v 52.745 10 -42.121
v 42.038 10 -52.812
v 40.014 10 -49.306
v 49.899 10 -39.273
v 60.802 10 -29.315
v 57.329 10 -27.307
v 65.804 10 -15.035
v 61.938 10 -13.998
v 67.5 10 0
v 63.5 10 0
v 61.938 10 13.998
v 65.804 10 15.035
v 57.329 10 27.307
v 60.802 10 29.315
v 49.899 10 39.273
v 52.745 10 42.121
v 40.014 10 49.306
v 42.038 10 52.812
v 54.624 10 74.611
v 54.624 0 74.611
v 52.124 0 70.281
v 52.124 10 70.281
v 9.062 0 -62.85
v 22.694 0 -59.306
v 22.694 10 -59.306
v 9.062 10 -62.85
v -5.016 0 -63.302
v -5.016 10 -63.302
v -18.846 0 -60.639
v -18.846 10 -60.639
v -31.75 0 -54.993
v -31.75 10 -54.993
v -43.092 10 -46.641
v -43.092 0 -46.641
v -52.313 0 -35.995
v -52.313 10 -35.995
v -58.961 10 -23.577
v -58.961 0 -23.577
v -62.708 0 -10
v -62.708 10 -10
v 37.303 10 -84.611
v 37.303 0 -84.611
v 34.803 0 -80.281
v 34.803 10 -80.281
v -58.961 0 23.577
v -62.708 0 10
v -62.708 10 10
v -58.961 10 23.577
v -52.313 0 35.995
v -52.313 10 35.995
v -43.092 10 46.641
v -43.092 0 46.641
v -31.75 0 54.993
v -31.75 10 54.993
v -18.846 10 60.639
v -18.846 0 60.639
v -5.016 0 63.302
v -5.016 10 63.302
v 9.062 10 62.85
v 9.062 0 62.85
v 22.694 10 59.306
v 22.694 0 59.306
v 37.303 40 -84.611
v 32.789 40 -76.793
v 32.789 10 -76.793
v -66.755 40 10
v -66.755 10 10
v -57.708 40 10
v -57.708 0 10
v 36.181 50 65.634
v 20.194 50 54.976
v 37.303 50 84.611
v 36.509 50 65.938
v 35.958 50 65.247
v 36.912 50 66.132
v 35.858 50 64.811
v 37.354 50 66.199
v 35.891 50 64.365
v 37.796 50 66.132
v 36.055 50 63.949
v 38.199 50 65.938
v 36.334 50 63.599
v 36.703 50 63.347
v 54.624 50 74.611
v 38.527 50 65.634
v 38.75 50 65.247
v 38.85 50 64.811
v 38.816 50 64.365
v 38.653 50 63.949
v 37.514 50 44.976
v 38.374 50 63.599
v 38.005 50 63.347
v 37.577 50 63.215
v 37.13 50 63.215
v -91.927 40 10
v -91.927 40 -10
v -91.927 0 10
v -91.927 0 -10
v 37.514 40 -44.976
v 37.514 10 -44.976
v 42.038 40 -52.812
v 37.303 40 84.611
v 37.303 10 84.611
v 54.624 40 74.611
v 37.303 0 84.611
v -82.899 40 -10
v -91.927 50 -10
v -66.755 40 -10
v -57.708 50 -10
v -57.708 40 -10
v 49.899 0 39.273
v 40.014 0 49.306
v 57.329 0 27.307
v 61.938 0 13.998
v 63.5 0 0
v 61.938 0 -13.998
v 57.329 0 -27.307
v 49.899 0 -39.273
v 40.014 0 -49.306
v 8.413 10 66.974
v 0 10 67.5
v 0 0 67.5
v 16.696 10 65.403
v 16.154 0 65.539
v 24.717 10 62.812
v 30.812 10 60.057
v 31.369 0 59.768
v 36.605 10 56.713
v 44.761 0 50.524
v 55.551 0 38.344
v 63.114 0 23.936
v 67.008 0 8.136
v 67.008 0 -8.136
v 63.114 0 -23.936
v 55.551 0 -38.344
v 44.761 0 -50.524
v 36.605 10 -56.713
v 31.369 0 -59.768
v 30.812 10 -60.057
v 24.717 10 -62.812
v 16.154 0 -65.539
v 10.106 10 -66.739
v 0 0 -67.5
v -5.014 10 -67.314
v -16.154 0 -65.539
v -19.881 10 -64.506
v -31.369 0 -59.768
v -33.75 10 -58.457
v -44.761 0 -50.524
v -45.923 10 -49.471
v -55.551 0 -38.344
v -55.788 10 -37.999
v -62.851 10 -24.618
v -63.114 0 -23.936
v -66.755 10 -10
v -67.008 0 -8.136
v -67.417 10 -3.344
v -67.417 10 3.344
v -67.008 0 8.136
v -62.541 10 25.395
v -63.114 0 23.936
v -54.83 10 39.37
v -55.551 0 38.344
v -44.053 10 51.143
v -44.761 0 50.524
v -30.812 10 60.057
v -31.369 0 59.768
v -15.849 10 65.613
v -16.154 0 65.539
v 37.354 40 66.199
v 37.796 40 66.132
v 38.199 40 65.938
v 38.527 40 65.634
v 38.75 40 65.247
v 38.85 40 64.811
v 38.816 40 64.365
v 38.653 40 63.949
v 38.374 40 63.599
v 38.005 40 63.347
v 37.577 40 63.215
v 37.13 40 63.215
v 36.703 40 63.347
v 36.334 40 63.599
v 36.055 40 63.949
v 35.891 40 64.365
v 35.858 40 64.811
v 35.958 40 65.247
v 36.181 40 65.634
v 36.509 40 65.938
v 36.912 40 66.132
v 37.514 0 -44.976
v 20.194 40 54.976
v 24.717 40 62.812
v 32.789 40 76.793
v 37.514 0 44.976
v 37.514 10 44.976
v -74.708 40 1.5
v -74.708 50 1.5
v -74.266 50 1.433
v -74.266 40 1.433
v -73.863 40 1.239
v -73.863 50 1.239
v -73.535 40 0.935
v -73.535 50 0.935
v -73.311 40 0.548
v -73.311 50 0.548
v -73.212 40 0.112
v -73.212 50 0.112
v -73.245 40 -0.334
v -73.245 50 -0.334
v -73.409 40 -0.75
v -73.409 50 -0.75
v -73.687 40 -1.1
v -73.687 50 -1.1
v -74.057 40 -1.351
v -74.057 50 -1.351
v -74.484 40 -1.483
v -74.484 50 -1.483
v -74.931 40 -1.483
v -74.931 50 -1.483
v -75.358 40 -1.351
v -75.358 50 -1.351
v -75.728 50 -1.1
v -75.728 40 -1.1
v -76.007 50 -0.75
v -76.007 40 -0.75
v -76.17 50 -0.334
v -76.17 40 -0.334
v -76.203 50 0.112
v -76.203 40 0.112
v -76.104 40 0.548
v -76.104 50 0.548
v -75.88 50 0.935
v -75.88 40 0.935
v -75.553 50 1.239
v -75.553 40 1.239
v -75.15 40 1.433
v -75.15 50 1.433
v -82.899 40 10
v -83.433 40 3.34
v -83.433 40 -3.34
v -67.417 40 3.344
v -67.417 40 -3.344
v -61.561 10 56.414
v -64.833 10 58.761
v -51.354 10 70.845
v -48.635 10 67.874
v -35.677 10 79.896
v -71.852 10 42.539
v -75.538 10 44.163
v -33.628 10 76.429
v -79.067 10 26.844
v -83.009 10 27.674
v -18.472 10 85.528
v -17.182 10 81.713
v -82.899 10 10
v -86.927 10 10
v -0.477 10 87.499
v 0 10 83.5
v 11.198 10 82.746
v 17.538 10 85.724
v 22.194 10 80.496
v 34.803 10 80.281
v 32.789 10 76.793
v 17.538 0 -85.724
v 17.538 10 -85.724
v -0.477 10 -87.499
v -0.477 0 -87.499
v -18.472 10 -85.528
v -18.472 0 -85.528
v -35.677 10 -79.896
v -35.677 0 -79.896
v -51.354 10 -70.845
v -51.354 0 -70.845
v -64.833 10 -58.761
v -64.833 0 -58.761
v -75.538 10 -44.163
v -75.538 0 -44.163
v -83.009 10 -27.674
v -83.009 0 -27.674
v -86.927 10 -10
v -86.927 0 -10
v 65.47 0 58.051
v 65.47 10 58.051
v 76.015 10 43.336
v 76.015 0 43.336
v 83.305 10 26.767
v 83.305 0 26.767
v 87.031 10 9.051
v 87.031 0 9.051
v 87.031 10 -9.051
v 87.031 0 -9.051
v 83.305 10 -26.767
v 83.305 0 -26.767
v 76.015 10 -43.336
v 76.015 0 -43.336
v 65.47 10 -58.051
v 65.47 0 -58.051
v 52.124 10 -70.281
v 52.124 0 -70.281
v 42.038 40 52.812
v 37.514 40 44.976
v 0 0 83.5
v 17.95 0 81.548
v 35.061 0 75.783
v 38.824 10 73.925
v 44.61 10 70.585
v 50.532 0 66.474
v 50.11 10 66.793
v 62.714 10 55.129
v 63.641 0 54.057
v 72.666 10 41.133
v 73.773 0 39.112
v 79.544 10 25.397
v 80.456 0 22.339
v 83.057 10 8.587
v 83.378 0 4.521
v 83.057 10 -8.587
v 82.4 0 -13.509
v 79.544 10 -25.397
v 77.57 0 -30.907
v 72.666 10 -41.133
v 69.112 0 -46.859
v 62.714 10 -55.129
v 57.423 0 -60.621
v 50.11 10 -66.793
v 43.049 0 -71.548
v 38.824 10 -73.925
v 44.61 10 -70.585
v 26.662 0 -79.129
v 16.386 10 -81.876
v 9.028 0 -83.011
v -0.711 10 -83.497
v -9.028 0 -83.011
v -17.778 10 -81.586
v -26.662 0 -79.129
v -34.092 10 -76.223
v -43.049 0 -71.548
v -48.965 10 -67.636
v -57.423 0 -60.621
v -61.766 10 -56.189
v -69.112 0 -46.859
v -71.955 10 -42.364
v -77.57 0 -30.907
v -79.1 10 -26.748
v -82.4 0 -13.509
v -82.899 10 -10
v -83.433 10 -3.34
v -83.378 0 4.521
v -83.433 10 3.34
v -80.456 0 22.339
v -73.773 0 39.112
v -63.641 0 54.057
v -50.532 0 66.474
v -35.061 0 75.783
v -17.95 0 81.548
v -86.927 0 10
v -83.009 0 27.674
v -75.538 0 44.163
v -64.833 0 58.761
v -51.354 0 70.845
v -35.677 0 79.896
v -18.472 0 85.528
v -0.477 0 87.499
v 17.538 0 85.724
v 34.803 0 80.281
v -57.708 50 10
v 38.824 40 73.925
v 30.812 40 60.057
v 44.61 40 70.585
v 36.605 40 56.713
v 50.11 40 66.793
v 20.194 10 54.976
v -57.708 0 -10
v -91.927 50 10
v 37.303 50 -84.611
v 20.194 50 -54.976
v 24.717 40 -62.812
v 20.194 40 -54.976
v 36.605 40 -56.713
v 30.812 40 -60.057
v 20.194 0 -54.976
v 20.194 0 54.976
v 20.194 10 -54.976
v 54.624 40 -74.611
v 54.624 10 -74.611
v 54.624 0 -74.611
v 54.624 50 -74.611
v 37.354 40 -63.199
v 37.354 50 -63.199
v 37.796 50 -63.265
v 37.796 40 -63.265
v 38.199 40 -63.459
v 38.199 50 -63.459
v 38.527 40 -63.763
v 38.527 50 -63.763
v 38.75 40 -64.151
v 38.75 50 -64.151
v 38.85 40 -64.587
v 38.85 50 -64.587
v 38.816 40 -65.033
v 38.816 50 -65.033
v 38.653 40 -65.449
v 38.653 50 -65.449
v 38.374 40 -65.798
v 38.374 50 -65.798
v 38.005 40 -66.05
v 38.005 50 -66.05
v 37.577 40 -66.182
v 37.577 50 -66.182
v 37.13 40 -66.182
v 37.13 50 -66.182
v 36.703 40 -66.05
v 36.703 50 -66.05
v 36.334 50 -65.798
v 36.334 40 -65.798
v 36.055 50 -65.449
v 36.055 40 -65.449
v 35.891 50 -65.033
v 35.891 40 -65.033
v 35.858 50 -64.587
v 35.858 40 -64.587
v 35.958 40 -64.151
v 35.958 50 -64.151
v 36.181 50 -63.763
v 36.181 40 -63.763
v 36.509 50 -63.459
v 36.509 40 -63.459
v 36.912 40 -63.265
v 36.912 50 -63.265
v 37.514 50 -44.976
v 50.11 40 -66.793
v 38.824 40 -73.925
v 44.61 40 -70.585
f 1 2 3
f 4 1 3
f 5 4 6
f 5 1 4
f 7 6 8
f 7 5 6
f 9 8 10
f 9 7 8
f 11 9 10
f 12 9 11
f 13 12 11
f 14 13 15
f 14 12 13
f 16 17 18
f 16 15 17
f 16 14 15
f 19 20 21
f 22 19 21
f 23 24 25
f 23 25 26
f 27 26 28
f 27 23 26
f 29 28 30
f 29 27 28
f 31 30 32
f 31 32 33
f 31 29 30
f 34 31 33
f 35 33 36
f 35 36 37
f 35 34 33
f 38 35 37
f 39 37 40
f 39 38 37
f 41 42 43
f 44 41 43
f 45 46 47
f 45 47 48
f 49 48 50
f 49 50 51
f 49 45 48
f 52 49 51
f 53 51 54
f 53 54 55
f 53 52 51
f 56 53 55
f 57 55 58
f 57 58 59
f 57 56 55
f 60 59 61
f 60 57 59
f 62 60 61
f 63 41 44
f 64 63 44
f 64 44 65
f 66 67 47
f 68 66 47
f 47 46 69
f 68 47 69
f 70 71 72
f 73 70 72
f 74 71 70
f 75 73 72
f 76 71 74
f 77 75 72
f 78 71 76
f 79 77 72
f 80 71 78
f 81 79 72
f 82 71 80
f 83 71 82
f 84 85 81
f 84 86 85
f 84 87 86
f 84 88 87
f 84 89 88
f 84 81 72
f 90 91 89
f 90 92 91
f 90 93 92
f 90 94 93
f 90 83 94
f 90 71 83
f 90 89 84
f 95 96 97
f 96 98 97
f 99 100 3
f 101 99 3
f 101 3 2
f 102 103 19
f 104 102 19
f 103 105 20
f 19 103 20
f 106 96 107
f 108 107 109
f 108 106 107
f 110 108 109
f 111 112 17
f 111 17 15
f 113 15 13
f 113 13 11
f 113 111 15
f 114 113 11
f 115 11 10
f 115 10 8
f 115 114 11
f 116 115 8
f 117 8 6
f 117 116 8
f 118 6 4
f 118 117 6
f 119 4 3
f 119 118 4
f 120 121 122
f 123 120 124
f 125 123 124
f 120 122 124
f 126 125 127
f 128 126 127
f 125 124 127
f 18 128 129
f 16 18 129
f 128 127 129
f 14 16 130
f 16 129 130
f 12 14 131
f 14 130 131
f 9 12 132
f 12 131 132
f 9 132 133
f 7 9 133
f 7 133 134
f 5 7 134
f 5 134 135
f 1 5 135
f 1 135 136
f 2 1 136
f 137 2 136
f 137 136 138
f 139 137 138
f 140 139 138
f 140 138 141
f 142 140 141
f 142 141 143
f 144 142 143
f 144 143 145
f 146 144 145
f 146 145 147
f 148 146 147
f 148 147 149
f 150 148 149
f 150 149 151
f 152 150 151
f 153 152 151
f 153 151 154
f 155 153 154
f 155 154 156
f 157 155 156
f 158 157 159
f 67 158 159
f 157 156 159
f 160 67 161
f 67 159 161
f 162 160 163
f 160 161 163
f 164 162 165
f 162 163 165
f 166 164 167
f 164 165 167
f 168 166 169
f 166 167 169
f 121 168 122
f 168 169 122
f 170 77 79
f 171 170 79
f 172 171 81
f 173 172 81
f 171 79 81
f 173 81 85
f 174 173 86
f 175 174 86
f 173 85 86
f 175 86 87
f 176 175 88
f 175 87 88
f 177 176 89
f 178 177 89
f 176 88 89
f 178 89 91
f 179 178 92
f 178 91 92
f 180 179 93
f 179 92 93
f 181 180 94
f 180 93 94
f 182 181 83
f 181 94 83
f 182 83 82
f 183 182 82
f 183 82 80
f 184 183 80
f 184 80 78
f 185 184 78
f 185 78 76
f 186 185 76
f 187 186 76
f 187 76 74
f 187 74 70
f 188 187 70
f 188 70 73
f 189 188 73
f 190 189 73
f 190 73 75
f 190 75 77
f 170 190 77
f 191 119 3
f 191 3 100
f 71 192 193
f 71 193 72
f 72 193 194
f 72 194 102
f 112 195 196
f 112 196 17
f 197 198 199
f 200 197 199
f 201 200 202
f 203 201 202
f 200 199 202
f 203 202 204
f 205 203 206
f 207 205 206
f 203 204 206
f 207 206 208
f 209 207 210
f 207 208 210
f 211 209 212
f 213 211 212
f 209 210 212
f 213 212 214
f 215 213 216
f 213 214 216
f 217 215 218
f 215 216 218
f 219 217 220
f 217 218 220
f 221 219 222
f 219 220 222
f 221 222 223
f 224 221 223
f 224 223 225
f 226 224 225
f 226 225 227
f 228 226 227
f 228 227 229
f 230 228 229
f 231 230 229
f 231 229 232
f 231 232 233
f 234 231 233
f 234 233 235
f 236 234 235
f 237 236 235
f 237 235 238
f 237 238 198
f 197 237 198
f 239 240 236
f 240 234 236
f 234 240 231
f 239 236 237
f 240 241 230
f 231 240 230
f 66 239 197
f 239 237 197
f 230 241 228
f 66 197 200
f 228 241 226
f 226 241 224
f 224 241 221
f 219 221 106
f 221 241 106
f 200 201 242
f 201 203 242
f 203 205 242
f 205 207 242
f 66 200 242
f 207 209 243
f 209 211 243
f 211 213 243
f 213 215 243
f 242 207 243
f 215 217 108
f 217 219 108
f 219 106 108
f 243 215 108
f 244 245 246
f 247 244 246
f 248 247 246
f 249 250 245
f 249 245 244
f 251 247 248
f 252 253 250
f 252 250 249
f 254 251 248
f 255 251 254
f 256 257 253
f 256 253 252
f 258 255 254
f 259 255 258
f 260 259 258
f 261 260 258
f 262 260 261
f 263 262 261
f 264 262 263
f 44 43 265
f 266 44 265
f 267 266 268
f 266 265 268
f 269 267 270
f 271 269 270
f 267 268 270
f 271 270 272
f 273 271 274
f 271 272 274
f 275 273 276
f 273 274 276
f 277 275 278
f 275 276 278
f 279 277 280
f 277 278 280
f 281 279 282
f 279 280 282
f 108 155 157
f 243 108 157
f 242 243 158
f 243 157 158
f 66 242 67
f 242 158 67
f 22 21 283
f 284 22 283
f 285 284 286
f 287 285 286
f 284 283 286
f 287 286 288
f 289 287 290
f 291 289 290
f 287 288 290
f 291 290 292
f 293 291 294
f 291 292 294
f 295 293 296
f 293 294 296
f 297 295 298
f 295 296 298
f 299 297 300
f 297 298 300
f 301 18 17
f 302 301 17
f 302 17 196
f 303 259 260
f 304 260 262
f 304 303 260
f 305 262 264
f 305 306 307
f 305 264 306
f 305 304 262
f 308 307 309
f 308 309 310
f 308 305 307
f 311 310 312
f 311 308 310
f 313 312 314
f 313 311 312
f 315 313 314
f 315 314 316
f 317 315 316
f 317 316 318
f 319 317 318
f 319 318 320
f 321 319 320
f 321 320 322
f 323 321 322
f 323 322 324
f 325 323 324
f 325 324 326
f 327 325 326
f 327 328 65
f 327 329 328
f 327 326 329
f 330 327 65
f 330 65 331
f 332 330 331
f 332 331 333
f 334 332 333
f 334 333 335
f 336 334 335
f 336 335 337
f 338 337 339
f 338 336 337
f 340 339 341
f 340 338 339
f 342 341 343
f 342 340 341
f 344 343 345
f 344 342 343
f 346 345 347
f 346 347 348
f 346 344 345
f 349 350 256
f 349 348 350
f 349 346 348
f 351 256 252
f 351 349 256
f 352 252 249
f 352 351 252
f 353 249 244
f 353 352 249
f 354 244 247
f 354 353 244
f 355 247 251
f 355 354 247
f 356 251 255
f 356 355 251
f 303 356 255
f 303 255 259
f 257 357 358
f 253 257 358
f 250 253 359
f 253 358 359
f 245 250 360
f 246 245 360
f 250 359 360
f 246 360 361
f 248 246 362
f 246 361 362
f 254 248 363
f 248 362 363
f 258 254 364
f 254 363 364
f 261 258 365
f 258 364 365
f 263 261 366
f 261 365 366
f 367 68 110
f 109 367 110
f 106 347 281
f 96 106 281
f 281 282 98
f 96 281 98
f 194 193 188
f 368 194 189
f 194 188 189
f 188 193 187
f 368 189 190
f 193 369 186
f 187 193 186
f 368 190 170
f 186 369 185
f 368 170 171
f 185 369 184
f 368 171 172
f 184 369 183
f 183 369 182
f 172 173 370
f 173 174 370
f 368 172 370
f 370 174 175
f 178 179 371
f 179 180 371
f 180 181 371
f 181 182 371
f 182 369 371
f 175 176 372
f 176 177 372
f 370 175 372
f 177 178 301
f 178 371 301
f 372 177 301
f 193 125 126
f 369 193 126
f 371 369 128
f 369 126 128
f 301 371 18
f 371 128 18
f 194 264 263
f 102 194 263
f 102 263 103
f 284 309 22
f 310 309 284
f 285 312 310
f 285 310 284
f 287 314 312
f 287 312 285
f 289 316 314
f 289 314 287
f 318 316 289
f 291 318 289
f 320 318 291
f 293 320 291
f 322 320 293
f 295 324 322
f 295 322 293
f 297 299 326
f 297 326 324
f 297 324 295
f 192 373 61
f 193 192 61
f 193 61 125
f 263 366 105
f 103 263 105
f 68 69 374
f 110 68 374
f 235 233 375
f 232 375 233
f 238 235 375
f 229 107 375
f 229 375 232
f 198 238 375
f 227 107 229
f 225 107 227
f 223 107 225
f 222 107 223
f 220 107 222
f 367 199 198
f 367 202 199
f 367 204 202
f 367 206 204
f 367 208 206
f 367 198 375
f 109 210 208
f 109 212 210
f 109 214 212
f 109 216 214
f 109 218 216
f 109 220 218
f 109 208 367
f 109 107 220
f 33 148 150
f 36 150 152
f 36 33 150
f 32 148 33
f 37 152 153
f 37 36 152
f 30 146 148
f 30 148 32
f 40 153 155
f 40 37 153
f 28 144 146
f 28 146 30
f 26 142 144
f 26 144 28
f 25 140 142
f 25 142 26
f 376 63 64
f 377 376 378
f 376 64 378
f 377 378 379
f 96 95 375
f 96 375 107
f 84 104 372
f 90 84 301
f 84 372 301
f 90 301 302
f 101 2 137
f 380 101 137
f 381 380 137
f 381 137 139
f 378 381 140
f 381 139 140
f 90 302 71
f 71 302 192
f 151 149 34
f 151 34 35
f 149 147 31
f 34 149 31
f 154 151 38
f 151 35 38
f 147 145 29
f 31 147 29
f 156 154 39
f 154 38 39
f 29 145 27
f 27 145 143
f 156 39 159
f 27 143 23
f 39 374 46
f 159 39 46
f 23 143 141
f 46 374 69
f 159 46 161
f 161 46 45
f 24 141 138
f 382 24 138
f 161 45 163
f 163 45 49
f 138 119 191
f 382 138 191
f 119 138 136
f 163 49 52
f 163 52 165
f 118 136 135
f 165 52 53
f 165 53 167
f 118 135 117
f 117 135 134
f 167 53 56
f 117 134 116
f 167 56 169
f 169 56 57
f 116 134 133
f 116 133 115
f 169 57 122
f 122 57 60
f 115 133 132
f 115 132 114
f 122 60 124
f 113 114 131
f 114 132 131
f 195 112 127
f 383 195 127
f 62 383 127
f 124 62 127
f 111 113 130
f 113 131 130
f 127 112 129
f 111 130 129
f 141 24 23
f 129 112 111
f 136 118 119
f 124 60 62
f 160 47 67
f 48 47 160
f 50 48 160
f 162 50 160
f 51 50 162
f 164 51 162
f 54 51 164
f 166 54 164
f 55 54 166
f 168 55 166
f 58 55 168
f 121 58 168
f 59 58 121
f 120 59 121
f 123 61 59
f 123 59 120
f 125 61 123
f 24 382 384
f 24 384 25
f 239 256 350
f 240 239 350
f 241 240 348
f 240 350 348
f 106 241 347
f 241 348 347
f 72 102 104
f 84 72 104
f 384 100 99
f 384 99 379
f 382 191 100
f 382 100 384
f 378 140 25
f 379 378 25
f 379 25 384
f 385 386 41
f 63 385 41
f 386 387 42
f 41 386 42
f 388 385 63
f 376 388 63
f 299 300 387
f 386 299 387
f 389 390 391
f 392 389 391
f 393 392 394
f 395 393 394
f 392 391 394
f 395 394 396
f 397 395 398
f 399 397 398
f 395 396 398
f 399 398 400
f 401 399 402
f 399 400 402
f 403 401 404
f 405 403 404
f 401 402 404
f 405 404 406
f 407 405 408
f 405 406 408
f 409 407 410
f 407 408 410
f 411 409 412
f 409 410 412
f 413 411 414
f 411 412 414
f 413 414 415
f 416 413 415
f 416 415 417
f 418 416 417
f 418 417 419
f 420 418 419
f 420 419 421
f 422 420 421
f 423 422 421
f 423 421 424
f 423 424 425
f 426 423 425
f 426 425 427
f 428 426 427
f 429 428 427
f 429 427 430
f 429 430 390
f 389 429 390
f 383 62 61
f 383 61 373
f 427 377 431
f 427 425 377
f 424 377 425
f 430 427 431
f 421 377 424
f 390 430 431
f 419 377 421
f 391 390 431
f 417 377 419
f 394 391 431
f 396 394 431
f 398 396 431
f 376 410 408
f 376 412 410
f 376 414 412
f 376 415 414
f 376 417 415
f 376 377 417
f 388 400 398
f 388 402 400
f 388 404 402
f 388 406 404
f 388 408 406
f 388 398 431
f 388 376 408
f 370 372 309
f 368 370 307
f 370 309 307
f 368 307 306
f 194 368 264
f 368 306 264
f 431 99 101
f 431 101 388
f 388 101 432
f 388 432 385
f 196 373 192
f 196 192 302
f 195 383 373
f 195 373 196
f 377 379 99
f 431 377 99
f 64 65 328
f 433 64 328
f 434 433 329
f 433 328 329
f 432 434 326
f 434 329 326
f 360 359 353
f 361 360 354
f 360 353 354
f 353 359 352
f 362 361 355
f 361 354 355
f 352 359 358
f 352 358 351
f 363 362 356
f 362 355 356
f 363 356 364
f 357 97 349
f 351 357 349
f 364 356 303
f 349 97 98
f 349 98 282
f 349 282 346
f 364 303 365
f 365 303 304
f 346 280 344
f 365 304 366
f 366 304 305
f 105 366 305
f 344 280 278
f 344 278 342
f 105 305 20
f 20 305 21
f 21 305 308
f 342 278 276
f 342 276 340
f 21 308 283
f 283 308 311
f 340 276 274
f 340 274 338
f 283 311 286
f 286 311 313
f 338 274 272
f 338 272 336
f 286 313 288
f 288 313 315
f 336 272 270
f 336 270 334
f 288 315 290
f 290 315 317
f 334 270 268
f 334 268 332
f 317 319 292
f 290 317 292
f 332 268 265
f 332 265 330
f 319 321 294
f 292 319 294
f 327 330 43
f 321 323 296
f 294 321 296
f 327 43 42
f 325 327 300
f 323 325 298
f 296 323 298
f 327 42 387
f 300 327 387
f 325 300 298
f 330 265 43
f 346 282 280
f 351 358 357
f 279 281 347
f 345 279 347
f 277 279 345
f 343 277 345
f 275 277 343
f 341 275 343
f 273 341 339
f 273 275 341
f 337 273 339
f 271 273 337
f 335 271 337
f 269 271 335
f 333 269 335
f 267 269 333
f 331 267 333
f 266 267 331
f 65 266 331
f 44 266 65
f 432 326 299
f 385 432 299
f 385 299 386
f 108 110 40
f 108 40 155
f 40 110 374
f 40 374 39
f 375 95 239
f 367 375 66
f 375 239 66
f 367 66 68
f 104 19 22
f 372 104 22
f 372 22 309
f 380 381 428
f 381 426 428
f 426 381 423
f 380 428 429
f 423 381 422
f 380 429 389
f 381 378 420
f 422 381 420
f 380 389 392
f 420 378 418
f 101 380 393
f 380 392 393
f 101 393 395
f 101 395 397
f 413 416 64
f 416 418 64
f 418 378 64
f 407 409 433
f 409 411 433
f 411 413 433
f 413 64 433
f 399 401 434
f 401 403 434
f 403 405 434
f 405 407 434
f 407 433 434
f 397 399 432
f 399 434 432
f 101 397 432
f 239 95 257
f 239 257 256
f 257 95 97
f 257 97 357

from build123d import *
from build123d.topology import SkipClean

# Parameters (mm, degrees)
IZIM1_R                       = 83.5
Y_KSEKLIK_EKSTR_ZYON3_DEPTH   = 10
IZIM1_R_2                     = 67.5
Y_KSEKLIK_EKSTR_ZYON3_2_DEPTH = 10
Y_KSEKLIK_EKSTR_ZYON6_DEPTH   = 30
Y_KSEKLIK_EKSTR_ZYON7_START   = 30
IZIM2_4_W                     = 34.219038219
IZIM2_4_H                     = 20
Y_KSEKLIK_EKSTR_ZYON7_DEPTH   = 10
IZIM3_R                       = 1.5
KES_EKSTR_ZYON1_DEPTH         = 20


with BuildPart() as part:
    # Çizim1 → Yükseklik-Ekstrüzyon3 (new body)
    with BuildSketch(Plane(origin=(0, 0, 0), x_dir=(1, 0, 0), z_dir=(0, 1, 0))):
        with BuildLine():
            Line((-91.926693254, 10), (-91.926693254, -10))
            Line((-91.926693254, -10), (-86.926693254, -10))
            ThreePointArc((-86.926693254, -10), (-43.75, -75.777222831), (34.803092589, -80.280724625))
            Line((34.803092589, -80.280724625), (37.303092589, -84.610851643))
            Line((37.303092589, -84.610851643), (54.623600665, -74.610851643))
            Line((54.623600665, -74.610851643), (52.123600665, -70.280724625))
            ThreePointArc((52.123600665, -70.280724625), (87.5, 0), (52.123600665, 70.280724625))
            Line((52.123600665, 70.280724625), (54.623600665, 74.610851643))
            Line((54.623600665, 74.610851643), (37.303092589, 84.610851643))
            Line((37.303092589, 84.610851643), (34.803092589, 80.280724625))
            ThreePointArc((34.803092589, 80.280724625), (-43.75, 75.777222831), (-86.926693254, 10))
            Line((-86.926693254, 10), (-91.926693254, 10))
        make_face()
        Circle(IZIM1_R, mode=Mode.SUBTRACT)
    extrude(amount=Y_KSEKLIK_EKSTR_ZYON3_DEPTH)



with BuildPart() as body_2:
    # Çizim1 → Y_kseklik-Ekstr_zyon3 2 (new body)
    with BuildSketch(Plane(origin=(0, 0, 0), x_dir=(1, 0, 0), z_dir=(0, 1, 0))):
        Circle(IZIM1_R_2)
        with BuildLine():
            Line((-57.707655035, 10), (-62.707655035, 10))
            ThreePointArc((-62.707655035, 10), (-31.75, 54.99261314), (22.69357348, 59.306422272))
            Line((22.69357348, 59.306422272), (20.19357348, 54.976295253))
            Line((20.19357348, 54.976295253), (37.514081555, 44.976295253))
            Line((37.514081555, 44.976295253), (40.014081555, 49.306422272))
            ThreePointArc((40.014081555, 49.306422272), (63.5, 0), (40.014081555, -49.306422272))
            Line((40.014081555, -49.306422272), (37.514081555, -44.976295253))
            Line((37.514081555, -44.976295253), (20.19357348, -54.976295253))
            Line((20.19357348, -54.976295253), (22.69357348, -59.306422272))
            ThreePointArc((22.69357348, -59.306422272), (-31.75, -54.99261314), (-62.707655035, -10))
            Line((-62.707655035, -10), (-57.707655035, -10))
            Line((-57.707655035, -10), (-57.707655035, 10))
        make_face(mode=Mode.SUBTRACT)
    extrude(amount=Y_KSEKLIK_EKSTR_ZYON3_2_DEPTH)


with BuildPart() as part_1:
    with SkipClean():  # the faces are left unmerged after this step: merging them gives an invalid solid
        add(part.part)

        add(body_2.part)  # Yükseklik-Ekstrüzyon6 merges body 2
        # Çizim2 → Yükseklik-Ekstrüzyon6 (add)
        with BuildSketch(Plane(origin=(0, 10, 0), x_dir=(1, 0, 0), z_dir=(0, 1, 0))):
            with BuildLine():
                Line((-57.707655035, -10), (-57.707655035, 10))
                Line((-57.707655035, 10), (-66.755149614, 10))
                ThreePointArc((-66.755149614, 10), (-67.5, 0), (-66.755149614, -10))
                Line((-66.755149614, -10), (-57.707655035, -10))
            make_face()
            with BuildLine():
                ThreePointArc((-82.899034976, -10), (-83.5, 0), (-82.899034976, 10))
                Line((-82.899034976, 10), (-91.926693254, 10))
                Line((-91.926693254, 10), (-91.926693254, -10))
                Line((-91.926693254, -10), (-82.899034976, -10))
            make_face()
            with BuildLine():
                ThreePointArc((42.037828845, 52.811655399), (33.75, 58.456714755), (24.717320769, 62.811655399))
                Line((24.717320769, 62.811655399), (20.19357348, 54.976295253))
                Line((20.19357348, 54.976295253), (37.514081555, 44.976295253))
                Line((37.514081555, 44.976295253), (42.037828845, 52.811655399))
            make_face()
            with BuildLine():
                Line((20.19357348, -54.976295253), (24.717320769, -62.811655399))
                ThreePointArc((24.717320769, -62.811655399), (33.75, -58.456714755), (42.037828845, -52.811655399))
                Line((42.037828845, -52.811655399), (37.514081555, -44.976295253))
                Line((37.514081555, -44.976295253), (20.19357348, -54.976295253))
            make_face()
            with BuildLine():
                Line((37.303092589, 84.610851643), (32.78926345, 76.792670239))
                ThreePointArc((32.78926345, 76.792670239), (41.75, 72.313121216), (50.109771526, 66.792670239))
                Line((50.109771526, 66.792670239), (54.623600665, 74.610851643))
                Line((54.623600665, 74.610851643), (37.303092589, 84.610851643))
            make_face()
            with BuildLine():
                ThreePointArc((50.109771526, -66.792670239), (41.75, -72.313121216), (32.78926345, -76.792670239))
                Line((32.78926345, -76.792670239), (37.303092589, -84.610851643))
                Line((37.303092589, -84.610851643), (54.623600665, -74.610851643))
                Line((54.623600665, -74.610851643), (50.109771526, -66.792670239))
            make_face()
        extrude(amount=Y_KSEKLIK_EKSTR_ZYON6_DEPTH)

    # Çizim2<4> → Yükseklik-Ekstrüzyon7 (add)
    with BuildSketch(Plane(origin=(0, 10, 0), x_dir=(1, 0, 0), z_dir=(0, 1, 0)).offset(Y_KSEKLIK_EKSTR_ZYON7_START)):
        with Locations((-74.817174145, 0)):
            Rectangle(IZIM2_4_W, IZIM2_4_H)
        Polygon((54.623600665, 74.610851643), (37.303092589, 84.610851643), (20.19357348, 54.976295253), (37.514081555, 44.976295253), align=None)
        Polygon((37.514081555, -44.976295253), (20.19357348, -54.976295253), (37.303092589, -84.610851643), (54.623600665, -74.610851643), align=None)
    extrude(amount=Y_KSEKLIK_EKSTR_ZYON7_DEPTH)

    # Çizim3 → Kes-Ekstrüzyon1 (cut)
    with SkipClean():  # the faces are left unmerged after this step: merging them gives an invalid solid
        with BuildSketch(Plane(origin=(0, 50, 0), x_dir=(1, 0, 0), z_dir=(0, 1, 0))):
            with Locations((-74.707655035, 0)):
                Circle(IZIM3_R)
            with Locations((37.353827518, 64.698727118)):
                Circle(IZIM3_R)
            with Locations((37.353827518, -64.698727118)):
                Circle(IZIM3_R)
        extrude(amount=-KES_EKSTR_ZYON1_DEPTH, mode=Mode.SUBTRACT)


solid = part_1.part
